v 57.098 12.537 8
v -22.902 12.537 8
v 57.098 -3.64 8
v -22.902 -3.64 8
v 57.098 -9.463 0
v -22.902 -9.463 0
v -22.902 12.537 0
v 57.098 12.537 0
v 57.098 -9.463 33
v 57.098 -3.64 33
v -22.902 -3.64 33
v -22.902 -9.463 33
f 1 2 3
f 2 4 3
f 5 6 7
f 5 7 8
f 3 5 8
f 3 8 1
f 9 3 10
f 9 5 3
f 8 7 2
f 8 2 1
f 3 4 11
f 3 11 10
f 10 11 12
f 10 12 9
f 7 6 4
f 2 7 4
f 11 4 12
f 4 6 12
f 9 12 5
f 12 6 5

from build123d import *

# Parameters (mm, degrees)
F0_W     = 80
F0_H     = 15
F1_DEPTH = 8
F2_W     = 80
F2_H     = 5.823
F3_DEPTH = 25
F4_DEPTH = 7


with BuildPart() as f1:
    # F0 (on Top) → F1 (new body)
    with BuildSketch(Plane.XY):
        with Locations((17.0978596434, -1.9628690071)):
            Rectangle(F0_W, F0_H)
    extrude(amount=F1_DEPTH)

    # F2 (on face) → F3 (join)
    with BuildSketch(Plane.XY.offset(8)):
        with Locations((17.0978596434, -6.5513690071)):
            Rectangle(F2_W, F2_H)
    extrude(amount=F3_DEPTH)

    # F4 (add): a face of the model
    f4_faces = [f1.faces().sort_by_distance(p)[0] for p in [
        (17.0978596434, 5.5371309929, 4),
    ]]
    extrude(f4_faces, amount=F4_DEPTH)


solid = f1.part
